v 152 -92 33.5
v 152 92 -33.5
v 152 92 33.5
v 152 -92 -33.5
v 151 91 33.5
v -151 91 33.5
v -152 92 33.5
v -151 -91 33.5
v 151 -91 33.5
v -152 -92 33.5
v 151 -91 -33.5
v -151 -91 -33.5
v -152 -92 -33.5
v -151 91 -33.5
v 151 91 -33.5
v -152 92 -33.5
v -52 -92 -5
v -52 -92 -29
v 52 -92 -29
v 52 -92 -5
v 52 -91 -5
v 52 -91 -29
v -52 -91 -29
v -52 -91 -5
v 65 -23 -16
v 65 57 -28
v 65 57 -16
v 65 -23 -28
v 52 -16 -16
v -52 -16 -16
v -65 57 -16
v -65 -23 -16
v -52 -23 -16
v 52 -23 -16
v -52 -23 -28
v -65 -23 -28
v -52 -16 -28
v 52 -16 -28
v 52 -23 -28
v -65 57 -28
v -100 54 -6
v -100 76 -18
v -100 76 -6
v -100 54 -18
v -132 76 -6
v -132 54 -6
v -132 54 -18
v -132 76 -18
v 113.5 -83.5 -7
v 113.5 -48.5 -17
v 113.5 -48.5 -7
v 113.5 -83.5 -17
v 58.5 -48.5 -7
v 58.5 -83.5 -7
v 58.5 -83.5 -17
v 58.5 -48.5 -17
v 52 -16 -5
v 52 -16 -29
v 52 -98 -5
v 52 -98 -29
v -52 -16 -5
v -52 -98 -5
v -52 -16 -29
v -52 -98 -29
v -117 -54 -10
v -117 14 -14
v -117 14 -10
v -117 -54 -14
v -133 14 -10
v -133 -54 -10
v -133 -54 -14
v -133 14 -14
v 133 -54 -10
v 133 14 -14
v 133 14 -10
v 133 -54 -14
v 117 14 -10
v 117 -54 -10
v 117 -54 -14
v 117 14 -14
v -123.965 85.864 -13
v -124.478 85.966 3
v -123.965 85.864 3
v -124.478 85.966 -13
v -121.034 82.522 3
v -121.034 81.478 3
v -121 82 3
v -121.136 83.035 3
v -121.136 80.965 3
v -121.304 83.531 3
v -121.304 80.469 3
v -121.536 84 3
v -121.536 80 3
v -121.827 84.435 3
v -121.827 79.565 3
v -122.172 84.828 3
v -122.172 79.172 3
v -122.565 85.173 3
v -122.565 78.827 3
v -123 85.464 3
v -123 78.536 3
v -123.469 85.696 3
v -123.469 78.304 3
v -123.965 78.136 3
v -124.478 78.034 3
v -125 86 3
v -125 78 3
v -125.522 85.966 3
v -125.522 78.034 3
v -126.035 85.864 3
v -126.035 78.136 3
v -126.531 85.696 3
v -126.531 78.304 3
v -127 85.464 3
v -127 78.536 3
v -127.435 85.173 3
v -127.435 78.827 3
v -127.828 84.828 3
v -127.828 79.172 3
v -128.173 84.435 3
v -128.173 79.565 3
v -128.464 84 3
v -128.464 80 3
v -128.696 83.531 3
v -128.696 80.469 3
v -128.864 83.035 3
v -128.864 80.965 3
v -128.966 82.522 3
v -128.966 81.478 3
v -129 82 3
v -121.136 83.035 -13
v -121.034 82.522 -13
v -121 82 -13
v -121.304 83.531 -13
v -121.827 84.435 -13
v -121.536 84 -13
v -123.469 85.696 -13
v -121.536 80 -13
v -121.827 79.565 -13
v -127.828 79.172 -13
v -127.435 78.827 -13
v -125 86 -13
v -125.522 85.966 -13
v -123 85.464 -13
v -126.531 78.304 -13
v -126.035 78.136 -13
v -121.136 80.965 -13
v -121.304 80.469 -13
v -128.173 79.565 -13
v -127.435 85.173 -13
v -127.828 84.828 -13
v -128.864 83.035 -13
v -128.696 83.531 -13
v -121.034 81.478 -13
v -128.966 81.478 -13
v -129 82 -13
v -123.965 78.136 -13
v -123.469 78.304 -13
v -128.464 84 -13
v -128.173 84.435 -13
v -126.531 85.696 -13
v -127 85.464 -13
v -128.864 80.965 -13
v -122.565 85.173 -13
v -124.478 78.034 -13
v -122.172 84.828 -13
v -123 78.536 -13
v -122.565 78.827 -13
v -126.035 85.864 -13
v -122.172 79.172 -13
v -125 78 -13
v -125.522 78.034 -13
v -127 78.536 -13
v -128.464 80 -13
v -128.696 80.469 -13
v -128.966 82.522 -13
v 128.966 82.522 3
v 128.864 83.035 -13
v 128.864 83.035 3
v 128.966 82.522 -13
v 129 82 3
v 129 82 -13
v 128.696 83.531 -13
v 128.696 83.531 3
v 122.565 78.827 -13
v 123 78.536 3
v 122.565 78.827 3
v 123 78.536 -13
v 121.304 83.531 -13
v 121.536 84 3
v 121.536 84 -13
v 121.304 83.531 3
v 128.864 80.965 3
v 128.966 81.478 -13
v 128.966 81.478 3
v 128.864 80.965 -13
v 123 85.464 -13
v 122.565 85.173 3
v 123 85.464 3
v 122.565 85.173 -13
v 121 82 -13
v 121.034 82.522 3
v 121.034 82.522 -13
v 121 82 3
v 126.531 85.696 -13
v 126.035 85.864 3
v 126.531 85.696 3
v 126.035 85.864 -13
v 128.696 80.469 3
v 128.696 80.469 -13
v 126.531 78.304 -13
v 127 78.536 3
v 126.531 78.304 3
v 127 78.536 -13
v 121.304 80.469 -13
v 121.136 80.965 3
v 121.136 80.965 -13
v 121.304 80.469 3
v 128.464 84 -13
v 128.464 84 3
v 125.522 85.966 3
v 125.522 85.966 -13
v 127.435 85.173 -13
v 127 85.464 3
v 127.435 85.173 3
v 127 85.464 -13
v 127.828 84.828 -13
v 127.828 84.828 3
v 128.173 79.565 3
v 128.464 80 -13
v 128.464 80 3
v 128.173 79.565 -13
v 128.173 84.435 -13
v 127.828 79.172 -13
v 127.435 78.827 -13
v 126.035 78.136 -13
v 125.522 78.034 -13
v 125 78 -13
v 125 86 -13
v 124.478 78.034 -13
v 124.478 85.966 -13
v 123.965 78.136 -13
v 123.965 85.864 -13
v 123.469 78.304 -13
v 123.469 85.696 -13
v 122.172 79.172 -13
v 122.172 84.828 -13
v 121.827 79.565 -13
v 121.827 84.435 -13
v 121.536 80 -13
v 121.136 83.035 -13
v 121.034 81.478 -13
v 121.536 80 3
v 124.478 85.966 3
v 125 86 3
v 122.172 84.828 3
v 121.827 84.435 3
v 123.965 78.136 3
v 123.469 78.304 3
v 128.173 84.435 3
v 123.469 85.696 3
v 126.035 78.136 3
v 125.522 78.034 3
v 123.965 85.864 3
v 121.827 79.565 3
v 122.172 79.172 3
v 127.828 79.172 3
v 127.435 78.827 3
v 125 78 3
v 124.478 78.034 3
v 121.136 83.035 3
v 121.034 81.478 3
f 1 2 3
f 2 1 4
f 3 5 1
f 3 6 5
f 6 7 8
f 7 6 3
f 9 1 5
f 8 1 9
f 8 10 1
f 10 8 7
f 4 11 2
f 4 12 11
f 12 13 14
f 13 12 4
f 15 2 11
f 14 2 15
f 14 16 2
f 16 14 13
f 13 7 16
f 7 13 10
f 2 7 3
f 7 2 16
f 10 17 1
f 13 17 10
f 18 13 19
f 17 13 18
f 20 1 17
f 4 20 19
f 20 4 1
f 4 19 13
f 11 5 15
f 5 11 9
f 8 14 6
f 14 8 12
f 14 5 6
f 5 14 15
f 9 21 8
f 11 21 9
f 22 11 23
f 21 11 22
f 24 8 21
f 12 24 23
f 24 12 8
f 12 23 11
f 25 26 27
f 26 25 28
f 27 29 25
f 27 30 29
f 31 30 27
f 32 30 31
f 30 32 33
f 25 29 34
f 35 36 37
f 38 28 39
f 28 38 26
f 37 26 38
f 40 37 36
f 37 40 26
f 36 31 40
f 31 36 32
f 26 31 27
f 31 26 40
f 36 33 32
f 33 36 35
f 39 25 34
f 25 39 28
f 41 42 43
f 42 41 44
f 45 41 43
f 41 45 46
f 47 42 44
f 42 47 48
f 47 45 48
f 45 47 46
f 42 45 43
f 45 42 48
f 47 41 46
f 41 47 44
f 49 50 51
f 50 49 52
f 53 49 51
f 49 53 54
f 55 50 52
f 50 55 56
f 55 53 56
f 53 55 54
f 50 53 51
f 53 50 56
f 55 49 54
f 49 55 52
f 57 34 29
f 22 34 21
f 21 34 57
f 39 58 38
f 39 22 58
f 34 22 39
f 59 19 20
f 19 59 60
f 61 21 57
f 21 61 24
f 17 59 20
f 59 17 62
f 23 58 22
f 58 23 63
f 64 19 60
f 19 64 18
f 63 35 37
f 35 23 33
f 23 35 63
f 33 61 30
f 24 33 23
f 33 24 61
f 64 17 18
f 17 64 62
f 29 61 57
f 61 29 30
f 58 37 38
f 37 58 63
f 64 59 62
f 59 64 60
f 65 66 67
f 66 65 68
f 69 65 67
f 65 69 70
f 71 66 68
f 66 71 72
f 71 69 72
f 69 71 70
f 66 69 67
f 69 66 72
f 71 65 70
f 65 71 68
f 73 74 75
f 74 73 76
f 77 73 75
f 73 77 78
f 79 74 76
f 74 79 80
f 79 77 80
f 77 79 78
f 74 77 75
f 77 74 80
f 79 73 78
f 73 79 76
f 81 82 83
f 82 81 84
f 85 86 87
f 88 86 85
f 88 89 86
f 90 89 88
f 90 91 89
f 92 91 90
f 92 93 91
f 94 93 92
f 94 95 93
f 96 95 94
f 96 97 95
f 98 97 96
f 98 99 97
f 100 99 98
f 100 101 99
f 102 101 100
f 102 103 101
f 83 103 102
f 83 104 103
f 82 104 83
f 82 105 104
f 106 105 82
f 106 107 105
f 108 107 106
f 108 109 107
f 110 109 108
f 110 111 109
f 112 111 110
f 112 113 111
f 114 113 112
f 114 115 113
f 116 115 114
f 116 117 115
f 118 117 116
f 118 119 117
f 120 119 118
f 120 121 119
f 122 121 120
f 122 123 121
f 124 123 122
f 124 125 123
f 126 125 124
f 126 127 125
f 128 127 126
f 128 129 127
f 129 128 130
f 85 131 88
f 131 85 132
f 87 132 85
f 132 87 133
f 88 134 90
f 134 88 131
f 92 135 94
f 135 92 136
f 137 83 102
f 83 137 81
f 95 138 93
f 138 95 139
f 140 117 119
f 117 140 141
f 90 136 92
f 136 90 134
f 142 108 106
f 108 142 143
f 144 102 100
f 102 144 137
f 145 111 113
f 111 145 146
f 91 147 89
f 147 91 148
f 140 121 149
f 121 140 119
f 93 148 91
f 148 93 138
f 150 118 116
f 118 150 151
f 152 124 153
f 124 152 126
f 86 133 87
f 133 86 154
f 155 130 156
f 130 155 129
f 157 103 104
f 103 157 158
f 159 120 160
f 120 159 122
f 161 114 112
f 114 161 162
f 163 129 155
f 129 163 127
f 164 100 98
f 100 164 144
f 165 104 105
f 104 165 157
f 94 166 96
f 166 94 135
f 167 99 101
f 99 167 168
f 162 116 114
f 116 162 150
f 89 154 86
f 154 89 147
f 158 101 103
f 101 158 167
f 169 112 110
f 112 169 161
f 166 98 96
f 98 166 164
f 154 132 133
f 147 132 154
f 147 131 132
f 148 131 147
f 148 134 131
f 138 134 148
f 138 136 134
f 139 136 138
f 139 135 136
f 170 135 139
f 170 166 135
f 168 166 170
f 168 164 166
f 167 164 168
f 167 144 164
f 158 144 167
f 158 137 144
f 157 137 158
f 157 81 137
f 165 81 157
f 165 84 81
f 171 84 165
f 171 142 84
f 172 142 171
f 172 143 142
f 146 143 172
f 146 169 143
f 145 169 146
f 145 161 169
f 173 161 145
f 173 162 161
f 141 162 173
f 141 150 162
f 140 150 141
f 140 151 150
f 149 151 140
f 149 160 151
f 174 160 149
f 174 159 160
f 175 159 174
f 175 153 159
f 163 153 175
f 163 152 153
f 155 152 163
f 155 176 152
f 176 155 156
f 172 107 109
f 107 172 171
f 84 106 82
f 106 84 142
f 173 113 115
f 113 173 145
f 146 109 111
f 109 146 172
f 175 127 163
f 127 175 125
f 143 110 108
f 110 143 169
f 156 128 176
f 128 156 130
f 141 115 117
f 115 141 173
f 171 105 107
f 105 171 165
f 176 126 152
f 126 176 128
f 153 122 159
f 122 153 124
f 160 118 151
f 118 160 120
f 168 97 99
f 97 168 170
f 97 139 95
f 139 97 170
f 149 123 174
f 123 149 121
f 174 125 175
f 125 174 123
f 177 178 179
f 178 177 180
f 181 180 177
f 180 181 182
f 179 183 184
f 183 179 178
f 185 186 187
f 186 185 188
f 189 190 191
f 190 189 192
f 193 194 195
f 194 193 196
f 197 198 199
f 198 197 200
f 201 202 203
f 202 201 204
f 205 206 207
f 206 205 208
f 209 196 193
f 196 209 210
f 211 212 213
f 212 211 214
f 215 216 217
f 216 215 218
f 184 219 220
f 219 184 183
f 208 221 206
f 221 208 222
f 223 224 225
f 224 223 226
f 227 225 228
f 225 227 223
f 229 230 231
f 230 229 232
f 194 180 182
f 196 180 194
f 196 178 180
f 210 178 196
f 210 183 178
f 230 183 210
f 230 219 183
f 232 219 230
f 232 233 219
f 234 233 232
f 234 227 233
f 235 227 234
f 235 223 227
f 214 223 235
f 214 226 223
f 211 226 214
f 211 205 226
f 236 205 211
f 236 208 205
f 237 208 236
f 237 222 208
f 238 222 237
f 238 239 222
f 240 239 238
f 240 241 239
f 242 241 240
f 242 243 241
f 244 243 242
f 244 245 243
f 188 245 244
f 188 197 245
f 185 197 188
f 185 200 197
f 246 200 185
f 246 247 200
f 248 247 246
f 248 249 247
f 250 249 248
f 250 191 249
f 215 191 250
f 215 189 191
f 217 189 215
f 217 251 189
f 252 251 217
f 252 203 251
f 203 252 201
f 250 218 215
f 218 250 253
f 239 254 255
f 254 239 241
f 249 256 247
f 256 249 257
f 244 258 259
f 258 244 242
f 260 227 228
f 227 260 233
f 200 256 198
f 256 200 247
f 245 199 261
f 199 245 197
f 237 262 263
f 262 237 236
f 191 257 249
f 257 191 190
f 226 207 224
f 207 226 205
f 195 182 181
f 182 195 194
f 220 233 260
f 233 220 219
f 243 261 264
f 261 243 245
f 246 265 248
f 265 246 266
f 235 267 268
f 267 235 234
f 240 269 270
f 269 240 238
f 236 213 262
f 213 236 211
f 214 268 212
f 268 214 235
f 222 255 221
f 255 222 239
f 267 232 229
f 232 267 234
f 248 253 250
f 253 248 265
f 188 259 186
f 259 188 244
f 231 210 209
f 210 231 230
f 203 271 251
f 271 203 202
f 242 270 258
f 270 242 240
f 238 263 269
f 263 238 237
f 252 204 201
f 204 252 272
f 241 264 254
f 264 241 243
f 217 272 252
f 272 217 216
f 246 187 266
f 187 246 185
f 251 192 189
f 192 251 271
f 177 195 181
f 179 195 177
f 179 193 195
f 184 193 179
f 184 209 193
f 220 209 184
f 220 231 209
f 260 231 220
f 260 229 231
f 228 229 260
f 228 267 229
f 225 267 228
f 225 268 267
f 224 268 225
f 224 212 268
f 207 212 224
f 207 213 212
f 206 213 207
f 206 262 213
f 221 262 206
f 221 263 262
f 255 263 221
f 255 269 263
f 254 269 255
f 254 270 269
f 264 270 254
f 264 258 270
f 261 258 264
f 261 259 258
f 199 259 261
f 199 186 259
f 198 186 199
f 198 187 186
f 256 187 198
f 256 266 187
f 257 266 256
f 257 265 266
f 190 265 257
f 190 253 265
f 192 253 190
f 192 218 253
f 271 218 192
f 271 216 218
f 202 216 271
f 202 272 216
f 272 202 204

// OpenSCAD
// Flytec Remote internal placement mockup R2 — enlarged battery reserve
// Units mm. Visual-only envelopes, not validated component CAD.
$fn=48;
W=310; H=190; D=70; wall=3;
color([0.35,0.38,0.42,0.10])
difference(){ cube([W-2*wall,H-2*wall,D-wall],center=true); cube([W-2*wall-2,H-2*wall-2,D-wall+1],center=true); }
module box(x,y,z,w,h,t,c){translate([x,y,z]) color(c) cube([w,h,t],center=true);}
// Integrated touchscreen/controller envelope moved upward to reserve lower space
box(0,17,-22,130,80,12,[0.12,0.35,0.9]);
// Radio near Antenna A
box(-116,65,-12,32,22,12,[0.95,0.55,0.08]);
// Charging/power zone near USB service side
box(86,-66,-12,55,35,10,[0.9,0.2,0.2]);
// Dedicated larger lower-central battery reserve: 104 x 82 x 24 mm (placeholder)
box(0,-57,-17,104,82,24,[0.2,0.55,0.25]);
// Four 18650 envelopes inside reserve, 65 mm cell axes along Y
module cell(x,y,z){translate([x,y,z]) rotate([90,0,0]) color([0.10,0.12,0.14]) cylinder(h=65,d=18,center=true);}
cell(-27,-55,-16); cell(-9,-55,-16); cell(9,-55,-16); cell(27,-55,-16);
// Side input/cable zones, illustrative
box(-125,-20,-12,16,68,4,[0.55,0.3,0.75]);
box(125,-20,-12,16,68,4,[0.55,0.3,0.75]);
// Antenna connectors and USB-C placeholder
translate([-125,82,-5]) color([0.7,0.7,0.7]) cylinder(h=16,d=8,center=true);
translate([125,82,-5]) color([0.7,0.7,0.7]) cylinder(h=16,d=8,center=true);
translate([0,-91,-10]) color([0.5,0.5,0.5]) cube([14,8,9],center=true);
